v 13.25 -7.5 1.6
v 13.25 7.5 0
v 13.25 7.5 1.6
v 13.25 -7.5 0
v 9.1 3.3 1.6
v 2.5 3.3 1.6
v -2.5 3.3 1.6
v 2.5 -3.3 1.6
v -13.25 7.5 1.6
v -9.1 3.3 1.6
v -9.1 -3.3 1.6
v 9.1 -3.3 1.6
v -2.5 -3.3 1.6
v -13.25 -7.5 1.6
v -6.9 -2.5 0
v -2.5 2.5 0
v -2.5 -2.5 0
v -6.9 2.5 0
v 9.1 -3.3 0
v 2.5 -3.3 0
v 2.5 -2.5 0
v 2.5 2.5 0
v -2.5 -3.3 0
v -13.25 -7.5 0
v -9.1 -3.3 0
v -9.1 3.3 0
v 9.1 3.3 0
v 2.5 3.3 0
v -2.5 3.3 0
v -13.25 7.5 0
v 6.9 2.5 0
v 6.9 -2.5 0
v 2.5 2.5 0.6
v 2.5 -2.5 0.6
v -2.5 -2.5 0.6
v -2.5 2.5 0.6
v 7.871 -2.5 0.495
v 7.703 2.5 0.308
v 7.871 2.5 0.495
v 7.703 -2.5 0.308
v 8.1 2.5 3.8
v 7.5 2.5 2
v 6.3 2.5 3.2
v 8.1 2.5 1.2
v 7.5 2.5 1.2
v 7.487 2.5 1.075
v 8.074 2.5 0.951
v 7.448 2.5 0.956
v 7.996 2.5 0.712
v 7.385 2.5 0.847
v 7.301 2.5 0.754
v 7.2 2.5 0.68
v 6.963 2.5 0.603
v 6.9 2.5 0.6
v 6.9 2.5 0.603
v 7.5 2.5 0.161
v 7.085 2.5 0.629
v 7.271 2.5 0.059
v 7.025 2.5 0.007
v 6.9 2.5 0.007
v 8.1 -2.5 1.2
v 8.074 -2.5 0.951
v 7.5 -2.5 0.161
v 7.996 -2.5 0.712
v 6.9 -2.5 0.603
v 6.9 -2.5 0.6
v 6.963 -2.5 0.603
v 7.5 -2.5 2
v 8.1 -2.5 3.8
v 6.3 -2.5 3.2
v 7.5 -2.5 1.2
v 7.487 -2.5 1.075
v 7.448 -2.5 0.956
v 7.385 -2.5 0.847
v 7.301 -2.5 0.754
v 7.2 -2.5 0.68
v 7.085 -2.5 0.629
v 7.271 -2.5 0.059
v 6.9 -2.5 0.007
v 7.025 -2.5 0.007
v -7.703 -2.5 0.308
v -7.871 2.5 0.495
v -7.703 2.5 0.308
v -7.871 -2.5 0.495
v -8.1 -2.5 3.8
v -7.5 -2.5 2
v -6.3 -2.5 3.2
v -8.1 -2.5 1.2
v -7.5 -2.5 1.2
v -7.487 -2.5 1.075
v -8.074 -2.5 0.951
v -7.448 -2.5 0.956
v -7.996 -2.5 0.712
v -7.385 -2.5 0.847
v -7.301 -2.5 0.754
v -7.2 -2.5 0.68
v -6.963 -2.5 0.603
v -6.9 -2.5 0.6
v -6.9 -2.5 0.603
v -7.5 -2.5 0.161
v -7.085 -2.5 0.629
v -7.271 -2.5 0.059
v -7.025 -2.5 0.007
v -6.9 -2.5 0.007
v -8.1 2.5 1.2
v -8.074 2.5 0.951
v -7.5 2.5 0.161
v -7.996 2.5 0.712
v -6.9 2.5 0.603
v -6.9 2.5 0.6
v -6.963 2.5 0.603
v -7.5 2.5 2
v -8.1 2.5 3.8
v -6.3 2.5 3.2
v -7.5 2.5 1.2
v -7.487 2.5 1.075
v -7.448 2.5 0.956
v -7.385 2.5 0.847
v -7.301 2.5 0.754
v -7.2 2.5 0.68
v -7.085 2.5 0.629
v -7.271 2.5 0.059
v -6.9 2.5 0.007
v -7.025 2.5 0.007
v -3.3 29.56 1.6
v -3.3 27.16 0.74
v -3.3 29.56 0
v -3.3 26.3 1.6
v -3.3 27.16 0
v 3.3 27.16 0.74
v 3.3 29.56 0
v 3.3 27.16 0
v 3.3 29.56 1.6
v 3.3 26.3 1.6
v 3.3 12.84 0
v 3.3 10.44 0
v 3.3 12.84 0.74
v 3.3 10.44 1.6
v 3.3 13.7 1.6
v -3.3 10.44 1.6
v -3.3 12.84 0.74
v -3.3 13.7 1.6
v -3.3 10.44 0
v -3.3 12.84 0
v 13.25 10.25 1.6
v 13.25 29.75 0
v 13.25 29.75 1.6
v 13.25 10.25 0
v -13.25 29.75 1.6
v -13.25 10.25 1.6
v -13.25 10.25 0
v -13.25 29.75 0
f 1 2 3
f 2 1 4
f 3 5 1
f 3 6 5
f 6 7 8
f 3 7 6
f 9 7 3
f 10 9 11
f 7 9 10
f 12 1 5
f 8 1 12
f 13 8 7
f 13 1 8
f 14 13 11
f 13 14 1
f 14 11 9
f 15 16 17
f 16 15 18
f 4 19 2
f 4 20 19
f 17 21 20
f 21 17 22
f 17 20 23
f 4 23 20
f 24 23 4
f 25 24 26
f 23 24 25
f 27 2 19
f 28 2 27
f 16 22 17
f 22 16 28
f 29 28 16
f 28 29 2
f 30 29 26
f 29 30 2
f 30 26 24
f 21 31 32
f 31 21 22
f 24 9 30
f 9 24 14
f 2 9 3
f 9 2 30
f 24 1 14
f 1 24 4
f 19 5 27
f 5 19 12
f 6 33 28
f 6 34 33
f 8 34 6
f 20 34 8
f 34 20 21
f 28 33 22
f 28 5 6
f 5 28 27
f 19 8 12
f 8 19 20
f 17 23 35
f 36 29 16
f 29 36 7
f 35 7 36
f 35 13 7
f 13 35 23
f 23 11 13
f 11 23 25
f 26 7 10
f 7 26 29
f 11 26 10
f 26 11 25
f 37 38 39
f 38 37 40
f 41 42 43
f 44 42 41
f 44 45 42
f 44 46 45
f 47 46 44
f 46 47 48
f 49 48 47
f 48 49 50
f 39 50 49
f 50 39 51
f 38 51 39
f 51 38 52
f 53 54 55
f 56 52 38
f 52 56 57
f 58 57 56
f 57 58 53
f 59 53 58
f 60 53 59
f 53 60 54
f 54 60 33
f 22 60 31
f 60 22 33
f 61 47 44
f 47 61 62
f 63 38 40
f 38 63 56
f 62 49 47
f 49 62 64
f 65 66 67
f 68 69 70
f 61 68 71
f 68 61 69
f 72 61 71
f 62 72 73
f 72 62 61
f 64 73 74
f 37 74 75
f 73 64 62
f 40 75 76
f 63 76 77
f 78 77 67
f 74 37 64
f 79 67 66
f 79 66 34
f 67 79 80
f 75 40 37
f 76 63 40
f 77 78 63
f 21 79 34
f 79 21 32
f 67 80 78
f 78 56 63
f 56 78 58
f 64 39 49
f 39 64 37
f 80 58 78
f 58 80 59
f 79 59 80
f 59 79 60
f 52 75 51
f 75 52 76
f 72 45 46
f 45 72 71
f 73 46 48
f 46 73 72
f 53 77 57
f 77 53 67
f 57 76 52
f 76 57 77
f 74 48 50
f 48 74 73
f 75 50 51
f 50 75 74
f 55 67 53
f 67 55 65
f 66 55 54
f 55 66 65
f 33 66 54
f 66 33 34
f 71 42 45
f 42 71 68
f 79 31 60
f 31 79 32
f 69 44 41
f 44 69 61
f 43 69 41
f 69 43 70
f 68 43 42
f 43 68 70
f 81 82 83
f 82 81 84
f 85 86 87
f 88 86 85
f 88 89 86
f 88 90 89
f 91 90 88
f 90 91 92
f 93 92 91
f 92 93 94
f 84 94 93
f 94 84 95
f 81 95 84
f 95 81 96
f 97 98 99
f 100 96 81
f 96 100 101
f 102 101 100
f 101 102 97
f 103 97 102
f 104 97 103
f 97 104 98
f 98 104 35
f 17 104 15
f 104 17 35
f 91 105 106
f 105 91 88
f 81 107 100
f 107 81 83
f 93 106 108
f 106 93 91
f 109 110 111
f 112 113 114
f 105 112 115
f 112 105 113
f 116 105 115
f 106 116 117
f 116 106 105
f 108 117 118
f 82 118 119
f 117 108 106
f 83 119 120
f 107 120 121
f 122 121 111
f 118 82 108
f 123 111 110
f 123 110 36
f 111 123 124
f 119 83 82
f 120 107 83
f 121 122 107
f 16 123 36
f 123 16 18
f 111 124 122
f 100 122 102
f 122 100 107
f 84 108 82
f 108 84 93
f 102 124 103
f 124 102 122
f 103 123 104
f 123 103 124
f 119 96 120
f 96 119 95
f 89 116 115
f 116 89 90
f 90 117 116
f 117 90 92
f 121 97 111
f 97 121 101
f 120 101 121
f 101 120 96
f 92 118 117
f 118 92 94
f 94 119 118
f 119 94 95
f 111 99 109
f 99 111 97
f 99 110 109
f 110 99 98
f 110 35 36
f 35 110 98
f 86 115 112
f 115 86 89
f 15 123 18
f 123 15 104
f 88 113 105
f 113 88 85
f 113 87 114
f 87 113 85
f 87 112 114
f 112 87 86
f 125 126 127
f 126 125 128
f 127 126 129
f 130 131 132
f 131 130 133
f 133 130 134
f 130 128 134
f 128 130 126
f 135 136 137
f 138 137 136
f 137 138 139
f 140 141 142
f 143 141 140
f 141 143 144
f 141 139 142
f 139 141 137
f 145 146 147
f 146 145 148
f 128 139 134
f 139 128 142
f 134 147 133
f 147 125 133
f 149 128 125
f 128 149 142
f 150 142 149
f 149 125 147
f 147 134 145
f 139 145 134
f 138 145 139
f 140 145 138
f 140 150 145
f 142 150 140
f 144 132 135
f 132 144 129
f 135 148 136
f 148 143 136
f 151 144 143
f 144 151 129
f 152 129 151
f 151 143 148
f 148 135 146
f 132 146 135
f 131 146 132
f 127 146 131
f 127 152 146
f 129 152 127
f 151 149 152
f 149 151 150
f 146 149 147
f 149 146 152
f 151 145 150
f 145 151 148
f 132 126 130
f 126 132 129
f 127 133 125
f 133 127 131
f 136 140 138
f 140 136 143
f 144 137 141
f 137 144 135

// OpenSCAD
plate_thick=1.6;
snap_thick=0.6;
snap_wide=5;
snap_len=5;
snap_space=0.8;
plate_width=15;
epsilon=0.1;

module baseplate() {
    translate([0, 0, plate_thick/2]) cube([1.5 * plate_width + 4, plate_width, plate_thick], center=true);
}

module wedge(w=1, d=1, h=1) {
    polyhedron(points = [
	    [0, 0, 0], [w, 0, 0], [w, d, 0], [0, d, 0],
	    [0, 0, h], [0, d, h], 
	],
	faces = [[0, 3, 1], [1, 3, 2],  // bottom
	[0, 1, 4], [2, 3, 5],  // sides
	[0, 4, 3], [3, 4, 5],  // back to the left
	[1, 5, 4], [1, 2, 5]  // wedge part.
	]);
}

module snap_spring(d=2, w=0, thick=1, h=1) {
    // Straight parts
    translate([-w, -d/2, 0]) cube([w - thick, d, thick]);
    translate([0, -d/2, 2 * thick]) cube([thick, d, h - 2 * thick]);

    // Rounding
    difference() {
	translate([-thick, d/2, 2 * thick]) rotate([90, 0, 0]) cylinder(r=2 * thick, h=d, $fn=30);
	translate([-thick, d/2 + epsilon, 2 * thick]) rotate([90, 0, 0]) cylinder(r=thick, h=d + 2 * epsilon, $fn=30);
	translate([-3 * thick, -d/2 - epsilon, thick]) cube([2 * thick, d + 2 * epsilon, 3 * thick]);
	translate([-3 * thick, -d/2 - epsilon, 2 * thick]) cube([3 * thick, d + 2 * epsilon, 2 * thick]);
    }

    // hook.
    translate([thick, d/2, h]) rotate([0, 0, 180]) wedge(w=3*thick, d=d, h=thick);
    translate([thick, d/2, h]) rotate([0, 90, 180]) wedge(w=3 * thick, d=d, h = 3 * thick);
}

module snap_space(d=2, w=0, thick=1, h=1) {
}
    
module sample_mount() {
    // Make space
    difference() {
	baseplate();
	cube([15, 3, 10], center=true);
    }
}

module hook_plate(snap_wide) {
    difference() {
	baseplate();
	translate([plate_width/2 - snap_len/2 + snap_space, 0, plate_thick/2]) cube([snap_len + 2 * snap_space, snap_wide + 2 * snap_space, plate_thick + 2 * epsilon], center=true);
	rotate([0, 0, 180]) translate([plate_width/2 - snap_len/2 + snap_space, 0, plate_thick/2]) cube([snap_len + 2 * snap_space, snap_wide + 2 * snap_space, plate_thick + 2 * epsilon], center=true);
    }

    translate([plate_width/2, 0, 0]) snap_spring(w=snap_len + epsilon, d=snap_wide, thick=snap_thick, h=2 * plate_thick);
    rotate([0, 0, 180]) translate([plate_width/2, 0, 0]) snap_spring(w=snap_len + epsilon, d=snap_wide, thick=snap_thick, h=2 * plate_thick);
}

module snap_plate() {
    difference() {
	scale([1, 1.3, 1]) baseplate();
	rotate([0, 0, 90]) translate([plate_width/2 - snap_len/2 + 4.2 * snap_space, 0, plate_thick/2]) cube([3 * snap_space, snap_wide + 2 * snap_space, plate_thick + 2 * epsilon], center=true);
	rotate([0, 0, -90]) translate([plate_width/2 - snap_len/2 + 4.2 * snap_space, 0, plate_thick/2]) cube([3 * snap_space, snap_wide + 2 * snap_space, plate_thick + 2 * epsilon], center=true);
#	translate([0, 0, -plate_thick]) rotate([0, 0, 90]) hook_plate(snap_wide + 2 * snap_space);
    }
}

hook_plate(snap_wide);
translate([0, plate_width + 5, 0]) snap_plate();
//snap_spring(w=2, thick=0.5, h=3);
